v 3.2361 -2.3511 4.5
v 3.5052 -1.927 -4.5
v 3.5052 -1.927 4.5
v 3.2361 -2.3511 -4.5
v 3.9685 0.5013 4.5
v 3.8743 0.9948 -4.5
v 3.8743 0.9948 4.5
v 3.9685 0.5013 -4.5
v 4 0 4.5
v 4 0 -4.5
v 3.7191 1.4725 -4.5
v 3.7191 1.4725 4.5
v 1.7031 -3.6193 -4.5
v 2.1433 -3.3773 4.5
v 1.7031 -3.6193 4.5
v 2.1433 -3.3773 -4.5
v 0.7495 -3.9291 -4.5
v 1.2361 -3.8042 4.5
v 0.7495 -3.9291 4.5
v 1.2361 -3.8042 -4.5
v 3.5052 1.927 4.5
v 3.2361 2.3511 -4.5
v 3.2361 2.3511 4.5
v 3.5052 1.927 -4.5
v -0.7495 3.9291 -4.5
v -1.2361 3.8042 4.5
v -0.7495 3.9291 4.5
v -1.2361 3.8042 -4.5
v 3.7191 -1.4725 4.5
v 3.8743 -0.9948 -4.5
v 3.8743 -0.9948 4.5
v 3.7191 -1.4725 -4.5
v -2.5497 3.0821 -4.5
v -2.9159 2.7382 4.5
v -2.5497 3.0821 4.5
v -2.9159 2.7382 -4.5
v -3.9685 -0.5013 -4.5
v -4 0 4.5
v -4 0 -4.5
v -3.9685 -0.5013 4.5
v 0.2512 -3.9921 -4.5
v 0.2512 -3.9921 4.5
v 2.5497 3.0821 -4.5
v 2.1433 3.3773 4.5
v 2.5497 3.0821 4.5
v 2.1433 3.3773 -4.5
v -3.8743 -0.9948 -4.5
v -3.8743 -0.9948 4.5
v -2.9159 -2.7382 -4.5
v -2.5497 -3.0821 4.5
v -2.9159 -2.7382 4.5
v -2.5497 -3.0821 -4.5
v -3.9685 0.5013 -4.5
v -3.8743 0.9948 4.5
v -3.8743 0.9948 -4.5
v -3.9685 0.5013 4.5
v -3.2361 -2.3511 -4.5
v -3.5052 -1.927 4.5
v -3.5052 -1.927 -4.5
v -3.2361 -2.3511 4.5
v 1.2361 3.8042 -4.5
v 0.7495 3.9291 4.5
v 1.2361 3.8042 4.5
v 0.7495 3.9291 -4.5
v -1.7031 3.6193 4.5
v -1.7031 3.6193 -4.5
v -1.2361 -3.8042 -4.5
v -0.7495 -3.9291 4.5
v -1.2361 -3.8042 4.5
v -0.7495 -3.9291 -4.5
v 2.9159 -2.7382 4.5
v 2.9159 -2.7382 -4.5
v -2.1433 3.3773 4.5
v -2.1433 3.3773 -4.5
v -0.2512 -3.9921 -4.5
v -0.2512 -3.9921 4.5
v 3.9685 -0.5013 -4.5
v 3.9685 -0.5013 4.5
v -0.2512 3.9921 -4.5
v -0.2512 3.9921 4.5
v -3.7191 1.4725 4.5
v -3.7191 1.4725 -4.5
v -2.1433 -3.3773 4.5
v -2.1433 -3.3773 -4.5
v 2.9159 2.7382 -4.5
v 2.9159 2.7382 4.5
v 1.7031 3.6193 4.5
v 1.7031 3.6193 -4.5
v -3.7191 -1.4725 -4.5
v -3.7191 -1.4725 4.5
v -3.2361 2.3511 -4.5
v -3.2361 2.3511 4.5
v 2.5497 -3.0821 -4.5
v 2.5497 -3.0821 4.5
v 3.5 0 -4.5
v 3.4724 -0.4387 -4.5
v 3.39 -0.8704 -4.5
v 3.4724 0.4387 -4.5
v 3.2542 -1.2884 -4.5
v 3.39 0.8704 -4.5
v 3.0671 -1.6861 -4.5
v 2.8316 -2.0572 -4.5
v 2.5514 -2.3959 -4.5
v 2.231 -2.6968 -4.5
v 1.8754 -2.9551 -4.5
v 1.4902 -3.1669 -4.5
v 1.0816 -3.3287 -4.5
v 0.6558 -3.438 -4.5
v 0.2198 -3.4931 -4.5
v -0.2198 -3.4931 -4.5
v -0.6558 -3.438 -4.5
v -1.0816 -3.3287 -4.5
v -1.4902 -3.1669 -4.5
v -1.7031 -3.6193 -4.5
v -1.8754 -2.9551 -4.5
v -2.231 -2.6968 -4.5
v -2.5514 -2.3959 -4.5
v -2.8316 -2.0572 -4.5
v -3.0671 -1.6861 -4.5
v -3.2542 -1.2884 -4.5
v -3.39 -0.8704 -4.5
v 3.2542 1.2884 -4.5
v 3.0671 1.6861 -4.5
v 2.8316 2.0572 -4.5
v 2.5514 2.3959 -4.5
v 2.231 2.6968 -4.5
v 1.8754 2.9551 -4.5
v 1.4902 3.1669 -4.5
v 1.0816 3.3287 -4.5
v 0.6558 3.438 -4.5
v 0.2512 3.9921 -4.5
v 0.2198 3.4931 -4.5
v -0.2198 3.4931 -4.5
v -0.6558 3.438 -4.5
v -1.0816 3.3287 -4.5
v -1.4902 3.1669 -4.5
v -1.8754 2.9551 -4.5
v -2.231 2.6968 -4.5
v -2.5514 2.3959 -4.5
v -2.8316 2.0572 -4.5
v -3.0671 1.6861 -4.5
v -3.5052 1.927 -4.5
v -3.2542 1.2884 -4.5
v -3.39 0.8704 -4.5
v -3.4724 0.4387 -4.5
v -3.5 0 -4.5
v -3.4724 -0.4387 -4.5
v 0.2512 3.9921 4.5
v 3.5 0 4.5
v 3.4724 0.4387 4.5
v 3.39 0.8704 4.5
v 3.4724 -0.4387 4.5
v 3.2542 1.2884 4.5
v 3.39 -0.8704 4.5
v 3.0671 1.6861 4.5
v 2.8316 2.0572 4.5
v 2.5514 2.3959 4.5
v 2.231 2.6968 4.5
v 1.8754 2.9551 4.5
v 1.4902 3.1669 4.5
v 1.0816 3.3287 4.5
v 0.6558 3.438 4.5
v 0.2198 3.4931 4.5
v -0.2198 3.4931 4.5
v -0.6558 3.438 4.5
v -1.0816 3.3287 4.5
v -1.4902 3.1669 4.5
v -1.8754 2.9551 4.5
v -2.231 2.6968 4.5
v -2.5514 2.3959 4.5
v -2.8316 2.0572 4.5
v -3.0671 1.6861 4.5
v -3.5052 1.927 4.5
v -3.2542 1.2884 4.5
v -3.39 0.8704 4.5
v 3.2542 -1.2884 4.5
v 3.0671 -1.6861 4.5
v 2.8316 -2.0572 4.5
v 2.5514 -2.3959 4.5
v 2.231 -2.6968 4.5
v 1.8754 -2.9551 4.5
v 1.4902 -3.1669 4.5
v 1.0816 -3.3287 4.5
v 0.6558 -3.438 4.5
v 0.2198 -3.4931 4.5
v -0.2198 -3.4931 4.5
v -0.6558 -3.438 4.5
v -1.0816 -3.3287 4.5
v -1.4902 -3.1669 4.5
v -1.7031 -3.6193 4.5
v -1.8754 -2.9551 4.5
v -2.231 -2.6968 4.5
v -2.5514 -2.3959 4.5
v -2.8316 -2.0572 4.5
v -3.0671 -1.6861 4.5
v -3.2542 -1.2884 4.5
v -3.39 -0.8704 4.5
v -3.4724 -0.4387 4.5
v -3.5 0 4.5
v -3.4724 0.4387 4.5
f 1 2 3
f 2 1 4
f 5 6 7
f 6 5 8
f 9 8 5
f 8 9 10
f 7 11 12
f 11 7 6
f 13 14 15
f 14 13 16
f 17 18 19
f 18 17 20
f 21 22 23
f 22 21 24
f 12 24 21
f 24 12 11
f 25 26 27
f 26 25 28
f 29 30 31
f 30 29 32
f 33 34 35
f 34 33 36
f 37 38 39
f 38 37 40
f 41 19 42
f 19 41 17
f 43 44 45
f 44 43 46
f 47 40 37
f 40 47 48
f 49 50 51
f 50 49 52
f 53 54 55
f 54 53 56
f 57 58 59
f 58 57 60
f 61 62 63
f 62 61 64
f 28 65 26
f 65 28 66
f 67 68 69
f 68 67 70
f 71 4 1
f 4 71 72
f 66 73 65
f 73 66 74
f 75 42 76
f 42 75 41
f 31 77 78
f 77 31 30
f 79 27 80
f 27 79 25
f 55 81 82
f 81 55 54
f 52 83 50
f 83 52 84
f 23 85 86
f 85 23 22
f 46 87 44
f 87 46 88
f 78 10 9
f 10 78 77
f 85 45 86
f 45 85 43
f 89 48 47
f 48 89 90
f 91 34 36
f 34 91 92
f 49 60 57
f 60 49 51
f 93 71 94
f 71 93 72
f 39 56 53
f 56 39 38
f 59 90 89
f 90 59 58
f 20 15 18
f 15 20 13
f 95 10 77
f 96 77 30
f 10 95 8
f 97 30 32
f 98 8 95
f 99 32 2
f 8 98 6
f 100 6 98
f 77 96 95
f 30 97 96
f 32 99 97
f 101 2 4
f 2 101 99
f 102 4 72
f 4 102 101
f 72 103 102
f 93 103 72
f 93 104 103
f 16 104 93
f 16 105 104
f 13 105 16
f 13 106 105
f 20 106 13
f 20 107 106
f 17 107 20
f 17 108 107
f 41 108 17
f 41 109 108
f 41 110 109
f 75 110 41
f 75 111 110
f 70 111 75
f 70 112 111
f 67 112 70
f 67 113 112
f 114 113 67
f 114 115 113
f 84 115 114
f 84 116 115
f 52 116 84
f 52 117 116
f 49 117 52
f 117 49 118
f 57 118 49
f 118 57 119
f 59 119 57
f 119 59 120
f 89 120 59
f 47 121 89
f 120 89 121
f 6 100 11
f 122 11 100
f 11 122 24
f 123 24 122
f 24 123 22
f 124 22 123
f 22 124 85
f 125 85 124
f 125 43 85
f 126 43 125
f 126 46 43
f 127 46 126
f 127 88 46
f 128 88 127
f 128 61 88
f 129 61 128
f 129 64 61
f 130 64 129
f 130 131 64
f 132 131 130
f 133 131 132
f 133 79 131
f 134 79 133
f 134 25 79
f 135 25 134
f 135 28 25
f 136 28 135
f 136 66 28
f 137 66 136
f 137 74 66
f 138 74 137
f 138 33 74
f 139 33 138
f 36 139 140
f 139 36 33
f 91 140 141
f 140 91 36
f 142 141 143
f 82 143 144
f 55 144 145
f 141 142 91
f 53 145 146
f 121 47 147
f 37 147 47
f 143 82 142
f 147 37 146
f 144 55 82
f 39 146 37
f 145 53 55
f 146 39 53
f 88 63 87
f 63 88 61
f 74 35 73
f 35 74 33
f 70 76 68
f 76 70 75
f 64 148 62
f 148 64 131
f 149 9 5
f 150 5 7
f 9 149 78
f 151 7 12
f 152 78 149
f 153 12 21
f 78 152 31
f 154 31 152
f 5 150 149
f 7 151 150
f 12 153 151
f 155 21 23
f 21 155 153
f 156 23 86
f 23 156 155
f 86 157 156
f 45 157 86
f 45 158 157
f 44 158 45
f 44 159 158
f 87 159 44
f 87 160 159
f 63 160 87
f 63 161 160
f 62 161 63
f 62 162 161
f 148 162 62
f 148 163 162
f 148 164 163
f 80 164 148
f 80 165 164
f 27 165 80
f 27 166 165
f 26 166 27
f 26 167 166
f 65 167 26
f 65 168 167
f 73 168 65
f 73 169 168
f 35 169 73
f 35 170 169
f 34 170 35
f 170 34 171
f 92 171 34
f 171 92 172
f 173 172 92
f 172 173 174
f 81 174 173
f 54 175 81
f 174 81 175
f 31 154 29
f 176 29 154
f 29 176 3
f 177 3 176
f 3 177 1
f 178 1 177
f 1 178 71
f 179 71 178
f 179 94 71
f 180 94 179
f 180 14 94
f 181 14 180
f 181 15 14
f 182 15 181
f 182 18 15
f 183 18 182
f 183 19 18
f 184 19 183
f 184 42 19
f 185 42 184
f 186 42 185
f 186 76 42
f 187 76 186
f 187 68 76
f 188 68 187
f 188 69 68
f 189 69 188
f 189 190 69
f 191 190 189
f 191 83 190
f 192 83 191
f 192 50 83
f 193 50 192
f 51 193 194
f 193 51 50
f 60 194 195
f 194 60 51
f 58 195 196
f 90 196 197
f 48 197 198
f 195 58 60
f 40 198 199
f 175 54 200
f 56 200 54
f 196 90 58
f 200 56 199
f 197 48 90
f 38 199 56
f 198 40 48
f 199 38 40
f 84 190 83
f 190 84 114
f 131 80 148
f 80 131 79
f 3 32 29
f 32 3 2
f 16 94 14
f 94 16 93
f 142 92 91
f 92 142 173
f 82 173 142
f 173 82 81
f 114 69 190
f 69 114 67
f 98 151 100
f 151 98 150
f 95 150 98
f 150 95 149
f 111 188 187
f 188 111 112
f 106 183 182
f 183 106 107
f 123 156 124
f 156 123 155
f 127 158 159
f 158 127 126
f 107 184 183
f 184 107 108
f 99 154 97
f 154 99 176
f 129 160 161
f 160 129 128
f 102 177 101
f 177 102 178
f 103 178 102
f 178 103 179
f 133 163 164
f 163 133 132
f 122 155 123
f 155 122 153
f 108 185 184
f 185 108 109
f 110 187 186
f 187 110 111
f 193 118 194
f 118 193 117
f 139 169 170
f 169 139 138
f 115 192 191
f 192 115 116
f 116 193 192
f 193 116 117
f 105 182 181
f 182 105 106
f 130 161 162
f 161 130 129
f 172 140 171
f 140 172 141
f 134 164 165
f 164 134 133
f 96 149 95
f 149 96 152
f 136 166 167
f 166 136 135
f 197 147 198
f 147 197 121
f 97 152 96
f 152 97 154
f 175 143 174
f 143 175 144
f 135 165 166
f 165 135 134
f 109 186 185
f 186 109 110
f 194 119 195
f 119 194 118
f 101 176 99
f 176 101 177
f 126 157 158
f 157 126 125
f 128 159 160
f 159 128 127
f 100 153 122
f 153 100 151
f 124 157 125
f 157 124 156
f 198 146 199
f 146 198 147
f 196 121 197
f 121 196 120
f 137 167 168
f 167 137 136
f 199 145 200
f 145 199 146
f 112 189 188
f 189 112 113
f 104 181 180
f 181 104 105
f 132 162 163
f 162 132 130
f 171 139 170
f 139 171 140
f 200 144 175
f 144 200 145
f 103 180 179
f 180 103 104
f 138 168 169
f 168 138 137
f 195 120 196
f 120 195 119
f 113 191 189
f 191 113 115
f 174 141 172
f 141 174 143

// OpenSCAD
$fn = 50;


difference() {
	union() {
		translate(v = [0, 0, -4.5000000000]) {
			cylinder(h = 9, r = 4.0000000000);
		}
	}
	union() {
		translate(v = [0, 0, -100.0000000000]) {
			cylinder(h = 200, r = 3.5000000000);
		}
	}
}
